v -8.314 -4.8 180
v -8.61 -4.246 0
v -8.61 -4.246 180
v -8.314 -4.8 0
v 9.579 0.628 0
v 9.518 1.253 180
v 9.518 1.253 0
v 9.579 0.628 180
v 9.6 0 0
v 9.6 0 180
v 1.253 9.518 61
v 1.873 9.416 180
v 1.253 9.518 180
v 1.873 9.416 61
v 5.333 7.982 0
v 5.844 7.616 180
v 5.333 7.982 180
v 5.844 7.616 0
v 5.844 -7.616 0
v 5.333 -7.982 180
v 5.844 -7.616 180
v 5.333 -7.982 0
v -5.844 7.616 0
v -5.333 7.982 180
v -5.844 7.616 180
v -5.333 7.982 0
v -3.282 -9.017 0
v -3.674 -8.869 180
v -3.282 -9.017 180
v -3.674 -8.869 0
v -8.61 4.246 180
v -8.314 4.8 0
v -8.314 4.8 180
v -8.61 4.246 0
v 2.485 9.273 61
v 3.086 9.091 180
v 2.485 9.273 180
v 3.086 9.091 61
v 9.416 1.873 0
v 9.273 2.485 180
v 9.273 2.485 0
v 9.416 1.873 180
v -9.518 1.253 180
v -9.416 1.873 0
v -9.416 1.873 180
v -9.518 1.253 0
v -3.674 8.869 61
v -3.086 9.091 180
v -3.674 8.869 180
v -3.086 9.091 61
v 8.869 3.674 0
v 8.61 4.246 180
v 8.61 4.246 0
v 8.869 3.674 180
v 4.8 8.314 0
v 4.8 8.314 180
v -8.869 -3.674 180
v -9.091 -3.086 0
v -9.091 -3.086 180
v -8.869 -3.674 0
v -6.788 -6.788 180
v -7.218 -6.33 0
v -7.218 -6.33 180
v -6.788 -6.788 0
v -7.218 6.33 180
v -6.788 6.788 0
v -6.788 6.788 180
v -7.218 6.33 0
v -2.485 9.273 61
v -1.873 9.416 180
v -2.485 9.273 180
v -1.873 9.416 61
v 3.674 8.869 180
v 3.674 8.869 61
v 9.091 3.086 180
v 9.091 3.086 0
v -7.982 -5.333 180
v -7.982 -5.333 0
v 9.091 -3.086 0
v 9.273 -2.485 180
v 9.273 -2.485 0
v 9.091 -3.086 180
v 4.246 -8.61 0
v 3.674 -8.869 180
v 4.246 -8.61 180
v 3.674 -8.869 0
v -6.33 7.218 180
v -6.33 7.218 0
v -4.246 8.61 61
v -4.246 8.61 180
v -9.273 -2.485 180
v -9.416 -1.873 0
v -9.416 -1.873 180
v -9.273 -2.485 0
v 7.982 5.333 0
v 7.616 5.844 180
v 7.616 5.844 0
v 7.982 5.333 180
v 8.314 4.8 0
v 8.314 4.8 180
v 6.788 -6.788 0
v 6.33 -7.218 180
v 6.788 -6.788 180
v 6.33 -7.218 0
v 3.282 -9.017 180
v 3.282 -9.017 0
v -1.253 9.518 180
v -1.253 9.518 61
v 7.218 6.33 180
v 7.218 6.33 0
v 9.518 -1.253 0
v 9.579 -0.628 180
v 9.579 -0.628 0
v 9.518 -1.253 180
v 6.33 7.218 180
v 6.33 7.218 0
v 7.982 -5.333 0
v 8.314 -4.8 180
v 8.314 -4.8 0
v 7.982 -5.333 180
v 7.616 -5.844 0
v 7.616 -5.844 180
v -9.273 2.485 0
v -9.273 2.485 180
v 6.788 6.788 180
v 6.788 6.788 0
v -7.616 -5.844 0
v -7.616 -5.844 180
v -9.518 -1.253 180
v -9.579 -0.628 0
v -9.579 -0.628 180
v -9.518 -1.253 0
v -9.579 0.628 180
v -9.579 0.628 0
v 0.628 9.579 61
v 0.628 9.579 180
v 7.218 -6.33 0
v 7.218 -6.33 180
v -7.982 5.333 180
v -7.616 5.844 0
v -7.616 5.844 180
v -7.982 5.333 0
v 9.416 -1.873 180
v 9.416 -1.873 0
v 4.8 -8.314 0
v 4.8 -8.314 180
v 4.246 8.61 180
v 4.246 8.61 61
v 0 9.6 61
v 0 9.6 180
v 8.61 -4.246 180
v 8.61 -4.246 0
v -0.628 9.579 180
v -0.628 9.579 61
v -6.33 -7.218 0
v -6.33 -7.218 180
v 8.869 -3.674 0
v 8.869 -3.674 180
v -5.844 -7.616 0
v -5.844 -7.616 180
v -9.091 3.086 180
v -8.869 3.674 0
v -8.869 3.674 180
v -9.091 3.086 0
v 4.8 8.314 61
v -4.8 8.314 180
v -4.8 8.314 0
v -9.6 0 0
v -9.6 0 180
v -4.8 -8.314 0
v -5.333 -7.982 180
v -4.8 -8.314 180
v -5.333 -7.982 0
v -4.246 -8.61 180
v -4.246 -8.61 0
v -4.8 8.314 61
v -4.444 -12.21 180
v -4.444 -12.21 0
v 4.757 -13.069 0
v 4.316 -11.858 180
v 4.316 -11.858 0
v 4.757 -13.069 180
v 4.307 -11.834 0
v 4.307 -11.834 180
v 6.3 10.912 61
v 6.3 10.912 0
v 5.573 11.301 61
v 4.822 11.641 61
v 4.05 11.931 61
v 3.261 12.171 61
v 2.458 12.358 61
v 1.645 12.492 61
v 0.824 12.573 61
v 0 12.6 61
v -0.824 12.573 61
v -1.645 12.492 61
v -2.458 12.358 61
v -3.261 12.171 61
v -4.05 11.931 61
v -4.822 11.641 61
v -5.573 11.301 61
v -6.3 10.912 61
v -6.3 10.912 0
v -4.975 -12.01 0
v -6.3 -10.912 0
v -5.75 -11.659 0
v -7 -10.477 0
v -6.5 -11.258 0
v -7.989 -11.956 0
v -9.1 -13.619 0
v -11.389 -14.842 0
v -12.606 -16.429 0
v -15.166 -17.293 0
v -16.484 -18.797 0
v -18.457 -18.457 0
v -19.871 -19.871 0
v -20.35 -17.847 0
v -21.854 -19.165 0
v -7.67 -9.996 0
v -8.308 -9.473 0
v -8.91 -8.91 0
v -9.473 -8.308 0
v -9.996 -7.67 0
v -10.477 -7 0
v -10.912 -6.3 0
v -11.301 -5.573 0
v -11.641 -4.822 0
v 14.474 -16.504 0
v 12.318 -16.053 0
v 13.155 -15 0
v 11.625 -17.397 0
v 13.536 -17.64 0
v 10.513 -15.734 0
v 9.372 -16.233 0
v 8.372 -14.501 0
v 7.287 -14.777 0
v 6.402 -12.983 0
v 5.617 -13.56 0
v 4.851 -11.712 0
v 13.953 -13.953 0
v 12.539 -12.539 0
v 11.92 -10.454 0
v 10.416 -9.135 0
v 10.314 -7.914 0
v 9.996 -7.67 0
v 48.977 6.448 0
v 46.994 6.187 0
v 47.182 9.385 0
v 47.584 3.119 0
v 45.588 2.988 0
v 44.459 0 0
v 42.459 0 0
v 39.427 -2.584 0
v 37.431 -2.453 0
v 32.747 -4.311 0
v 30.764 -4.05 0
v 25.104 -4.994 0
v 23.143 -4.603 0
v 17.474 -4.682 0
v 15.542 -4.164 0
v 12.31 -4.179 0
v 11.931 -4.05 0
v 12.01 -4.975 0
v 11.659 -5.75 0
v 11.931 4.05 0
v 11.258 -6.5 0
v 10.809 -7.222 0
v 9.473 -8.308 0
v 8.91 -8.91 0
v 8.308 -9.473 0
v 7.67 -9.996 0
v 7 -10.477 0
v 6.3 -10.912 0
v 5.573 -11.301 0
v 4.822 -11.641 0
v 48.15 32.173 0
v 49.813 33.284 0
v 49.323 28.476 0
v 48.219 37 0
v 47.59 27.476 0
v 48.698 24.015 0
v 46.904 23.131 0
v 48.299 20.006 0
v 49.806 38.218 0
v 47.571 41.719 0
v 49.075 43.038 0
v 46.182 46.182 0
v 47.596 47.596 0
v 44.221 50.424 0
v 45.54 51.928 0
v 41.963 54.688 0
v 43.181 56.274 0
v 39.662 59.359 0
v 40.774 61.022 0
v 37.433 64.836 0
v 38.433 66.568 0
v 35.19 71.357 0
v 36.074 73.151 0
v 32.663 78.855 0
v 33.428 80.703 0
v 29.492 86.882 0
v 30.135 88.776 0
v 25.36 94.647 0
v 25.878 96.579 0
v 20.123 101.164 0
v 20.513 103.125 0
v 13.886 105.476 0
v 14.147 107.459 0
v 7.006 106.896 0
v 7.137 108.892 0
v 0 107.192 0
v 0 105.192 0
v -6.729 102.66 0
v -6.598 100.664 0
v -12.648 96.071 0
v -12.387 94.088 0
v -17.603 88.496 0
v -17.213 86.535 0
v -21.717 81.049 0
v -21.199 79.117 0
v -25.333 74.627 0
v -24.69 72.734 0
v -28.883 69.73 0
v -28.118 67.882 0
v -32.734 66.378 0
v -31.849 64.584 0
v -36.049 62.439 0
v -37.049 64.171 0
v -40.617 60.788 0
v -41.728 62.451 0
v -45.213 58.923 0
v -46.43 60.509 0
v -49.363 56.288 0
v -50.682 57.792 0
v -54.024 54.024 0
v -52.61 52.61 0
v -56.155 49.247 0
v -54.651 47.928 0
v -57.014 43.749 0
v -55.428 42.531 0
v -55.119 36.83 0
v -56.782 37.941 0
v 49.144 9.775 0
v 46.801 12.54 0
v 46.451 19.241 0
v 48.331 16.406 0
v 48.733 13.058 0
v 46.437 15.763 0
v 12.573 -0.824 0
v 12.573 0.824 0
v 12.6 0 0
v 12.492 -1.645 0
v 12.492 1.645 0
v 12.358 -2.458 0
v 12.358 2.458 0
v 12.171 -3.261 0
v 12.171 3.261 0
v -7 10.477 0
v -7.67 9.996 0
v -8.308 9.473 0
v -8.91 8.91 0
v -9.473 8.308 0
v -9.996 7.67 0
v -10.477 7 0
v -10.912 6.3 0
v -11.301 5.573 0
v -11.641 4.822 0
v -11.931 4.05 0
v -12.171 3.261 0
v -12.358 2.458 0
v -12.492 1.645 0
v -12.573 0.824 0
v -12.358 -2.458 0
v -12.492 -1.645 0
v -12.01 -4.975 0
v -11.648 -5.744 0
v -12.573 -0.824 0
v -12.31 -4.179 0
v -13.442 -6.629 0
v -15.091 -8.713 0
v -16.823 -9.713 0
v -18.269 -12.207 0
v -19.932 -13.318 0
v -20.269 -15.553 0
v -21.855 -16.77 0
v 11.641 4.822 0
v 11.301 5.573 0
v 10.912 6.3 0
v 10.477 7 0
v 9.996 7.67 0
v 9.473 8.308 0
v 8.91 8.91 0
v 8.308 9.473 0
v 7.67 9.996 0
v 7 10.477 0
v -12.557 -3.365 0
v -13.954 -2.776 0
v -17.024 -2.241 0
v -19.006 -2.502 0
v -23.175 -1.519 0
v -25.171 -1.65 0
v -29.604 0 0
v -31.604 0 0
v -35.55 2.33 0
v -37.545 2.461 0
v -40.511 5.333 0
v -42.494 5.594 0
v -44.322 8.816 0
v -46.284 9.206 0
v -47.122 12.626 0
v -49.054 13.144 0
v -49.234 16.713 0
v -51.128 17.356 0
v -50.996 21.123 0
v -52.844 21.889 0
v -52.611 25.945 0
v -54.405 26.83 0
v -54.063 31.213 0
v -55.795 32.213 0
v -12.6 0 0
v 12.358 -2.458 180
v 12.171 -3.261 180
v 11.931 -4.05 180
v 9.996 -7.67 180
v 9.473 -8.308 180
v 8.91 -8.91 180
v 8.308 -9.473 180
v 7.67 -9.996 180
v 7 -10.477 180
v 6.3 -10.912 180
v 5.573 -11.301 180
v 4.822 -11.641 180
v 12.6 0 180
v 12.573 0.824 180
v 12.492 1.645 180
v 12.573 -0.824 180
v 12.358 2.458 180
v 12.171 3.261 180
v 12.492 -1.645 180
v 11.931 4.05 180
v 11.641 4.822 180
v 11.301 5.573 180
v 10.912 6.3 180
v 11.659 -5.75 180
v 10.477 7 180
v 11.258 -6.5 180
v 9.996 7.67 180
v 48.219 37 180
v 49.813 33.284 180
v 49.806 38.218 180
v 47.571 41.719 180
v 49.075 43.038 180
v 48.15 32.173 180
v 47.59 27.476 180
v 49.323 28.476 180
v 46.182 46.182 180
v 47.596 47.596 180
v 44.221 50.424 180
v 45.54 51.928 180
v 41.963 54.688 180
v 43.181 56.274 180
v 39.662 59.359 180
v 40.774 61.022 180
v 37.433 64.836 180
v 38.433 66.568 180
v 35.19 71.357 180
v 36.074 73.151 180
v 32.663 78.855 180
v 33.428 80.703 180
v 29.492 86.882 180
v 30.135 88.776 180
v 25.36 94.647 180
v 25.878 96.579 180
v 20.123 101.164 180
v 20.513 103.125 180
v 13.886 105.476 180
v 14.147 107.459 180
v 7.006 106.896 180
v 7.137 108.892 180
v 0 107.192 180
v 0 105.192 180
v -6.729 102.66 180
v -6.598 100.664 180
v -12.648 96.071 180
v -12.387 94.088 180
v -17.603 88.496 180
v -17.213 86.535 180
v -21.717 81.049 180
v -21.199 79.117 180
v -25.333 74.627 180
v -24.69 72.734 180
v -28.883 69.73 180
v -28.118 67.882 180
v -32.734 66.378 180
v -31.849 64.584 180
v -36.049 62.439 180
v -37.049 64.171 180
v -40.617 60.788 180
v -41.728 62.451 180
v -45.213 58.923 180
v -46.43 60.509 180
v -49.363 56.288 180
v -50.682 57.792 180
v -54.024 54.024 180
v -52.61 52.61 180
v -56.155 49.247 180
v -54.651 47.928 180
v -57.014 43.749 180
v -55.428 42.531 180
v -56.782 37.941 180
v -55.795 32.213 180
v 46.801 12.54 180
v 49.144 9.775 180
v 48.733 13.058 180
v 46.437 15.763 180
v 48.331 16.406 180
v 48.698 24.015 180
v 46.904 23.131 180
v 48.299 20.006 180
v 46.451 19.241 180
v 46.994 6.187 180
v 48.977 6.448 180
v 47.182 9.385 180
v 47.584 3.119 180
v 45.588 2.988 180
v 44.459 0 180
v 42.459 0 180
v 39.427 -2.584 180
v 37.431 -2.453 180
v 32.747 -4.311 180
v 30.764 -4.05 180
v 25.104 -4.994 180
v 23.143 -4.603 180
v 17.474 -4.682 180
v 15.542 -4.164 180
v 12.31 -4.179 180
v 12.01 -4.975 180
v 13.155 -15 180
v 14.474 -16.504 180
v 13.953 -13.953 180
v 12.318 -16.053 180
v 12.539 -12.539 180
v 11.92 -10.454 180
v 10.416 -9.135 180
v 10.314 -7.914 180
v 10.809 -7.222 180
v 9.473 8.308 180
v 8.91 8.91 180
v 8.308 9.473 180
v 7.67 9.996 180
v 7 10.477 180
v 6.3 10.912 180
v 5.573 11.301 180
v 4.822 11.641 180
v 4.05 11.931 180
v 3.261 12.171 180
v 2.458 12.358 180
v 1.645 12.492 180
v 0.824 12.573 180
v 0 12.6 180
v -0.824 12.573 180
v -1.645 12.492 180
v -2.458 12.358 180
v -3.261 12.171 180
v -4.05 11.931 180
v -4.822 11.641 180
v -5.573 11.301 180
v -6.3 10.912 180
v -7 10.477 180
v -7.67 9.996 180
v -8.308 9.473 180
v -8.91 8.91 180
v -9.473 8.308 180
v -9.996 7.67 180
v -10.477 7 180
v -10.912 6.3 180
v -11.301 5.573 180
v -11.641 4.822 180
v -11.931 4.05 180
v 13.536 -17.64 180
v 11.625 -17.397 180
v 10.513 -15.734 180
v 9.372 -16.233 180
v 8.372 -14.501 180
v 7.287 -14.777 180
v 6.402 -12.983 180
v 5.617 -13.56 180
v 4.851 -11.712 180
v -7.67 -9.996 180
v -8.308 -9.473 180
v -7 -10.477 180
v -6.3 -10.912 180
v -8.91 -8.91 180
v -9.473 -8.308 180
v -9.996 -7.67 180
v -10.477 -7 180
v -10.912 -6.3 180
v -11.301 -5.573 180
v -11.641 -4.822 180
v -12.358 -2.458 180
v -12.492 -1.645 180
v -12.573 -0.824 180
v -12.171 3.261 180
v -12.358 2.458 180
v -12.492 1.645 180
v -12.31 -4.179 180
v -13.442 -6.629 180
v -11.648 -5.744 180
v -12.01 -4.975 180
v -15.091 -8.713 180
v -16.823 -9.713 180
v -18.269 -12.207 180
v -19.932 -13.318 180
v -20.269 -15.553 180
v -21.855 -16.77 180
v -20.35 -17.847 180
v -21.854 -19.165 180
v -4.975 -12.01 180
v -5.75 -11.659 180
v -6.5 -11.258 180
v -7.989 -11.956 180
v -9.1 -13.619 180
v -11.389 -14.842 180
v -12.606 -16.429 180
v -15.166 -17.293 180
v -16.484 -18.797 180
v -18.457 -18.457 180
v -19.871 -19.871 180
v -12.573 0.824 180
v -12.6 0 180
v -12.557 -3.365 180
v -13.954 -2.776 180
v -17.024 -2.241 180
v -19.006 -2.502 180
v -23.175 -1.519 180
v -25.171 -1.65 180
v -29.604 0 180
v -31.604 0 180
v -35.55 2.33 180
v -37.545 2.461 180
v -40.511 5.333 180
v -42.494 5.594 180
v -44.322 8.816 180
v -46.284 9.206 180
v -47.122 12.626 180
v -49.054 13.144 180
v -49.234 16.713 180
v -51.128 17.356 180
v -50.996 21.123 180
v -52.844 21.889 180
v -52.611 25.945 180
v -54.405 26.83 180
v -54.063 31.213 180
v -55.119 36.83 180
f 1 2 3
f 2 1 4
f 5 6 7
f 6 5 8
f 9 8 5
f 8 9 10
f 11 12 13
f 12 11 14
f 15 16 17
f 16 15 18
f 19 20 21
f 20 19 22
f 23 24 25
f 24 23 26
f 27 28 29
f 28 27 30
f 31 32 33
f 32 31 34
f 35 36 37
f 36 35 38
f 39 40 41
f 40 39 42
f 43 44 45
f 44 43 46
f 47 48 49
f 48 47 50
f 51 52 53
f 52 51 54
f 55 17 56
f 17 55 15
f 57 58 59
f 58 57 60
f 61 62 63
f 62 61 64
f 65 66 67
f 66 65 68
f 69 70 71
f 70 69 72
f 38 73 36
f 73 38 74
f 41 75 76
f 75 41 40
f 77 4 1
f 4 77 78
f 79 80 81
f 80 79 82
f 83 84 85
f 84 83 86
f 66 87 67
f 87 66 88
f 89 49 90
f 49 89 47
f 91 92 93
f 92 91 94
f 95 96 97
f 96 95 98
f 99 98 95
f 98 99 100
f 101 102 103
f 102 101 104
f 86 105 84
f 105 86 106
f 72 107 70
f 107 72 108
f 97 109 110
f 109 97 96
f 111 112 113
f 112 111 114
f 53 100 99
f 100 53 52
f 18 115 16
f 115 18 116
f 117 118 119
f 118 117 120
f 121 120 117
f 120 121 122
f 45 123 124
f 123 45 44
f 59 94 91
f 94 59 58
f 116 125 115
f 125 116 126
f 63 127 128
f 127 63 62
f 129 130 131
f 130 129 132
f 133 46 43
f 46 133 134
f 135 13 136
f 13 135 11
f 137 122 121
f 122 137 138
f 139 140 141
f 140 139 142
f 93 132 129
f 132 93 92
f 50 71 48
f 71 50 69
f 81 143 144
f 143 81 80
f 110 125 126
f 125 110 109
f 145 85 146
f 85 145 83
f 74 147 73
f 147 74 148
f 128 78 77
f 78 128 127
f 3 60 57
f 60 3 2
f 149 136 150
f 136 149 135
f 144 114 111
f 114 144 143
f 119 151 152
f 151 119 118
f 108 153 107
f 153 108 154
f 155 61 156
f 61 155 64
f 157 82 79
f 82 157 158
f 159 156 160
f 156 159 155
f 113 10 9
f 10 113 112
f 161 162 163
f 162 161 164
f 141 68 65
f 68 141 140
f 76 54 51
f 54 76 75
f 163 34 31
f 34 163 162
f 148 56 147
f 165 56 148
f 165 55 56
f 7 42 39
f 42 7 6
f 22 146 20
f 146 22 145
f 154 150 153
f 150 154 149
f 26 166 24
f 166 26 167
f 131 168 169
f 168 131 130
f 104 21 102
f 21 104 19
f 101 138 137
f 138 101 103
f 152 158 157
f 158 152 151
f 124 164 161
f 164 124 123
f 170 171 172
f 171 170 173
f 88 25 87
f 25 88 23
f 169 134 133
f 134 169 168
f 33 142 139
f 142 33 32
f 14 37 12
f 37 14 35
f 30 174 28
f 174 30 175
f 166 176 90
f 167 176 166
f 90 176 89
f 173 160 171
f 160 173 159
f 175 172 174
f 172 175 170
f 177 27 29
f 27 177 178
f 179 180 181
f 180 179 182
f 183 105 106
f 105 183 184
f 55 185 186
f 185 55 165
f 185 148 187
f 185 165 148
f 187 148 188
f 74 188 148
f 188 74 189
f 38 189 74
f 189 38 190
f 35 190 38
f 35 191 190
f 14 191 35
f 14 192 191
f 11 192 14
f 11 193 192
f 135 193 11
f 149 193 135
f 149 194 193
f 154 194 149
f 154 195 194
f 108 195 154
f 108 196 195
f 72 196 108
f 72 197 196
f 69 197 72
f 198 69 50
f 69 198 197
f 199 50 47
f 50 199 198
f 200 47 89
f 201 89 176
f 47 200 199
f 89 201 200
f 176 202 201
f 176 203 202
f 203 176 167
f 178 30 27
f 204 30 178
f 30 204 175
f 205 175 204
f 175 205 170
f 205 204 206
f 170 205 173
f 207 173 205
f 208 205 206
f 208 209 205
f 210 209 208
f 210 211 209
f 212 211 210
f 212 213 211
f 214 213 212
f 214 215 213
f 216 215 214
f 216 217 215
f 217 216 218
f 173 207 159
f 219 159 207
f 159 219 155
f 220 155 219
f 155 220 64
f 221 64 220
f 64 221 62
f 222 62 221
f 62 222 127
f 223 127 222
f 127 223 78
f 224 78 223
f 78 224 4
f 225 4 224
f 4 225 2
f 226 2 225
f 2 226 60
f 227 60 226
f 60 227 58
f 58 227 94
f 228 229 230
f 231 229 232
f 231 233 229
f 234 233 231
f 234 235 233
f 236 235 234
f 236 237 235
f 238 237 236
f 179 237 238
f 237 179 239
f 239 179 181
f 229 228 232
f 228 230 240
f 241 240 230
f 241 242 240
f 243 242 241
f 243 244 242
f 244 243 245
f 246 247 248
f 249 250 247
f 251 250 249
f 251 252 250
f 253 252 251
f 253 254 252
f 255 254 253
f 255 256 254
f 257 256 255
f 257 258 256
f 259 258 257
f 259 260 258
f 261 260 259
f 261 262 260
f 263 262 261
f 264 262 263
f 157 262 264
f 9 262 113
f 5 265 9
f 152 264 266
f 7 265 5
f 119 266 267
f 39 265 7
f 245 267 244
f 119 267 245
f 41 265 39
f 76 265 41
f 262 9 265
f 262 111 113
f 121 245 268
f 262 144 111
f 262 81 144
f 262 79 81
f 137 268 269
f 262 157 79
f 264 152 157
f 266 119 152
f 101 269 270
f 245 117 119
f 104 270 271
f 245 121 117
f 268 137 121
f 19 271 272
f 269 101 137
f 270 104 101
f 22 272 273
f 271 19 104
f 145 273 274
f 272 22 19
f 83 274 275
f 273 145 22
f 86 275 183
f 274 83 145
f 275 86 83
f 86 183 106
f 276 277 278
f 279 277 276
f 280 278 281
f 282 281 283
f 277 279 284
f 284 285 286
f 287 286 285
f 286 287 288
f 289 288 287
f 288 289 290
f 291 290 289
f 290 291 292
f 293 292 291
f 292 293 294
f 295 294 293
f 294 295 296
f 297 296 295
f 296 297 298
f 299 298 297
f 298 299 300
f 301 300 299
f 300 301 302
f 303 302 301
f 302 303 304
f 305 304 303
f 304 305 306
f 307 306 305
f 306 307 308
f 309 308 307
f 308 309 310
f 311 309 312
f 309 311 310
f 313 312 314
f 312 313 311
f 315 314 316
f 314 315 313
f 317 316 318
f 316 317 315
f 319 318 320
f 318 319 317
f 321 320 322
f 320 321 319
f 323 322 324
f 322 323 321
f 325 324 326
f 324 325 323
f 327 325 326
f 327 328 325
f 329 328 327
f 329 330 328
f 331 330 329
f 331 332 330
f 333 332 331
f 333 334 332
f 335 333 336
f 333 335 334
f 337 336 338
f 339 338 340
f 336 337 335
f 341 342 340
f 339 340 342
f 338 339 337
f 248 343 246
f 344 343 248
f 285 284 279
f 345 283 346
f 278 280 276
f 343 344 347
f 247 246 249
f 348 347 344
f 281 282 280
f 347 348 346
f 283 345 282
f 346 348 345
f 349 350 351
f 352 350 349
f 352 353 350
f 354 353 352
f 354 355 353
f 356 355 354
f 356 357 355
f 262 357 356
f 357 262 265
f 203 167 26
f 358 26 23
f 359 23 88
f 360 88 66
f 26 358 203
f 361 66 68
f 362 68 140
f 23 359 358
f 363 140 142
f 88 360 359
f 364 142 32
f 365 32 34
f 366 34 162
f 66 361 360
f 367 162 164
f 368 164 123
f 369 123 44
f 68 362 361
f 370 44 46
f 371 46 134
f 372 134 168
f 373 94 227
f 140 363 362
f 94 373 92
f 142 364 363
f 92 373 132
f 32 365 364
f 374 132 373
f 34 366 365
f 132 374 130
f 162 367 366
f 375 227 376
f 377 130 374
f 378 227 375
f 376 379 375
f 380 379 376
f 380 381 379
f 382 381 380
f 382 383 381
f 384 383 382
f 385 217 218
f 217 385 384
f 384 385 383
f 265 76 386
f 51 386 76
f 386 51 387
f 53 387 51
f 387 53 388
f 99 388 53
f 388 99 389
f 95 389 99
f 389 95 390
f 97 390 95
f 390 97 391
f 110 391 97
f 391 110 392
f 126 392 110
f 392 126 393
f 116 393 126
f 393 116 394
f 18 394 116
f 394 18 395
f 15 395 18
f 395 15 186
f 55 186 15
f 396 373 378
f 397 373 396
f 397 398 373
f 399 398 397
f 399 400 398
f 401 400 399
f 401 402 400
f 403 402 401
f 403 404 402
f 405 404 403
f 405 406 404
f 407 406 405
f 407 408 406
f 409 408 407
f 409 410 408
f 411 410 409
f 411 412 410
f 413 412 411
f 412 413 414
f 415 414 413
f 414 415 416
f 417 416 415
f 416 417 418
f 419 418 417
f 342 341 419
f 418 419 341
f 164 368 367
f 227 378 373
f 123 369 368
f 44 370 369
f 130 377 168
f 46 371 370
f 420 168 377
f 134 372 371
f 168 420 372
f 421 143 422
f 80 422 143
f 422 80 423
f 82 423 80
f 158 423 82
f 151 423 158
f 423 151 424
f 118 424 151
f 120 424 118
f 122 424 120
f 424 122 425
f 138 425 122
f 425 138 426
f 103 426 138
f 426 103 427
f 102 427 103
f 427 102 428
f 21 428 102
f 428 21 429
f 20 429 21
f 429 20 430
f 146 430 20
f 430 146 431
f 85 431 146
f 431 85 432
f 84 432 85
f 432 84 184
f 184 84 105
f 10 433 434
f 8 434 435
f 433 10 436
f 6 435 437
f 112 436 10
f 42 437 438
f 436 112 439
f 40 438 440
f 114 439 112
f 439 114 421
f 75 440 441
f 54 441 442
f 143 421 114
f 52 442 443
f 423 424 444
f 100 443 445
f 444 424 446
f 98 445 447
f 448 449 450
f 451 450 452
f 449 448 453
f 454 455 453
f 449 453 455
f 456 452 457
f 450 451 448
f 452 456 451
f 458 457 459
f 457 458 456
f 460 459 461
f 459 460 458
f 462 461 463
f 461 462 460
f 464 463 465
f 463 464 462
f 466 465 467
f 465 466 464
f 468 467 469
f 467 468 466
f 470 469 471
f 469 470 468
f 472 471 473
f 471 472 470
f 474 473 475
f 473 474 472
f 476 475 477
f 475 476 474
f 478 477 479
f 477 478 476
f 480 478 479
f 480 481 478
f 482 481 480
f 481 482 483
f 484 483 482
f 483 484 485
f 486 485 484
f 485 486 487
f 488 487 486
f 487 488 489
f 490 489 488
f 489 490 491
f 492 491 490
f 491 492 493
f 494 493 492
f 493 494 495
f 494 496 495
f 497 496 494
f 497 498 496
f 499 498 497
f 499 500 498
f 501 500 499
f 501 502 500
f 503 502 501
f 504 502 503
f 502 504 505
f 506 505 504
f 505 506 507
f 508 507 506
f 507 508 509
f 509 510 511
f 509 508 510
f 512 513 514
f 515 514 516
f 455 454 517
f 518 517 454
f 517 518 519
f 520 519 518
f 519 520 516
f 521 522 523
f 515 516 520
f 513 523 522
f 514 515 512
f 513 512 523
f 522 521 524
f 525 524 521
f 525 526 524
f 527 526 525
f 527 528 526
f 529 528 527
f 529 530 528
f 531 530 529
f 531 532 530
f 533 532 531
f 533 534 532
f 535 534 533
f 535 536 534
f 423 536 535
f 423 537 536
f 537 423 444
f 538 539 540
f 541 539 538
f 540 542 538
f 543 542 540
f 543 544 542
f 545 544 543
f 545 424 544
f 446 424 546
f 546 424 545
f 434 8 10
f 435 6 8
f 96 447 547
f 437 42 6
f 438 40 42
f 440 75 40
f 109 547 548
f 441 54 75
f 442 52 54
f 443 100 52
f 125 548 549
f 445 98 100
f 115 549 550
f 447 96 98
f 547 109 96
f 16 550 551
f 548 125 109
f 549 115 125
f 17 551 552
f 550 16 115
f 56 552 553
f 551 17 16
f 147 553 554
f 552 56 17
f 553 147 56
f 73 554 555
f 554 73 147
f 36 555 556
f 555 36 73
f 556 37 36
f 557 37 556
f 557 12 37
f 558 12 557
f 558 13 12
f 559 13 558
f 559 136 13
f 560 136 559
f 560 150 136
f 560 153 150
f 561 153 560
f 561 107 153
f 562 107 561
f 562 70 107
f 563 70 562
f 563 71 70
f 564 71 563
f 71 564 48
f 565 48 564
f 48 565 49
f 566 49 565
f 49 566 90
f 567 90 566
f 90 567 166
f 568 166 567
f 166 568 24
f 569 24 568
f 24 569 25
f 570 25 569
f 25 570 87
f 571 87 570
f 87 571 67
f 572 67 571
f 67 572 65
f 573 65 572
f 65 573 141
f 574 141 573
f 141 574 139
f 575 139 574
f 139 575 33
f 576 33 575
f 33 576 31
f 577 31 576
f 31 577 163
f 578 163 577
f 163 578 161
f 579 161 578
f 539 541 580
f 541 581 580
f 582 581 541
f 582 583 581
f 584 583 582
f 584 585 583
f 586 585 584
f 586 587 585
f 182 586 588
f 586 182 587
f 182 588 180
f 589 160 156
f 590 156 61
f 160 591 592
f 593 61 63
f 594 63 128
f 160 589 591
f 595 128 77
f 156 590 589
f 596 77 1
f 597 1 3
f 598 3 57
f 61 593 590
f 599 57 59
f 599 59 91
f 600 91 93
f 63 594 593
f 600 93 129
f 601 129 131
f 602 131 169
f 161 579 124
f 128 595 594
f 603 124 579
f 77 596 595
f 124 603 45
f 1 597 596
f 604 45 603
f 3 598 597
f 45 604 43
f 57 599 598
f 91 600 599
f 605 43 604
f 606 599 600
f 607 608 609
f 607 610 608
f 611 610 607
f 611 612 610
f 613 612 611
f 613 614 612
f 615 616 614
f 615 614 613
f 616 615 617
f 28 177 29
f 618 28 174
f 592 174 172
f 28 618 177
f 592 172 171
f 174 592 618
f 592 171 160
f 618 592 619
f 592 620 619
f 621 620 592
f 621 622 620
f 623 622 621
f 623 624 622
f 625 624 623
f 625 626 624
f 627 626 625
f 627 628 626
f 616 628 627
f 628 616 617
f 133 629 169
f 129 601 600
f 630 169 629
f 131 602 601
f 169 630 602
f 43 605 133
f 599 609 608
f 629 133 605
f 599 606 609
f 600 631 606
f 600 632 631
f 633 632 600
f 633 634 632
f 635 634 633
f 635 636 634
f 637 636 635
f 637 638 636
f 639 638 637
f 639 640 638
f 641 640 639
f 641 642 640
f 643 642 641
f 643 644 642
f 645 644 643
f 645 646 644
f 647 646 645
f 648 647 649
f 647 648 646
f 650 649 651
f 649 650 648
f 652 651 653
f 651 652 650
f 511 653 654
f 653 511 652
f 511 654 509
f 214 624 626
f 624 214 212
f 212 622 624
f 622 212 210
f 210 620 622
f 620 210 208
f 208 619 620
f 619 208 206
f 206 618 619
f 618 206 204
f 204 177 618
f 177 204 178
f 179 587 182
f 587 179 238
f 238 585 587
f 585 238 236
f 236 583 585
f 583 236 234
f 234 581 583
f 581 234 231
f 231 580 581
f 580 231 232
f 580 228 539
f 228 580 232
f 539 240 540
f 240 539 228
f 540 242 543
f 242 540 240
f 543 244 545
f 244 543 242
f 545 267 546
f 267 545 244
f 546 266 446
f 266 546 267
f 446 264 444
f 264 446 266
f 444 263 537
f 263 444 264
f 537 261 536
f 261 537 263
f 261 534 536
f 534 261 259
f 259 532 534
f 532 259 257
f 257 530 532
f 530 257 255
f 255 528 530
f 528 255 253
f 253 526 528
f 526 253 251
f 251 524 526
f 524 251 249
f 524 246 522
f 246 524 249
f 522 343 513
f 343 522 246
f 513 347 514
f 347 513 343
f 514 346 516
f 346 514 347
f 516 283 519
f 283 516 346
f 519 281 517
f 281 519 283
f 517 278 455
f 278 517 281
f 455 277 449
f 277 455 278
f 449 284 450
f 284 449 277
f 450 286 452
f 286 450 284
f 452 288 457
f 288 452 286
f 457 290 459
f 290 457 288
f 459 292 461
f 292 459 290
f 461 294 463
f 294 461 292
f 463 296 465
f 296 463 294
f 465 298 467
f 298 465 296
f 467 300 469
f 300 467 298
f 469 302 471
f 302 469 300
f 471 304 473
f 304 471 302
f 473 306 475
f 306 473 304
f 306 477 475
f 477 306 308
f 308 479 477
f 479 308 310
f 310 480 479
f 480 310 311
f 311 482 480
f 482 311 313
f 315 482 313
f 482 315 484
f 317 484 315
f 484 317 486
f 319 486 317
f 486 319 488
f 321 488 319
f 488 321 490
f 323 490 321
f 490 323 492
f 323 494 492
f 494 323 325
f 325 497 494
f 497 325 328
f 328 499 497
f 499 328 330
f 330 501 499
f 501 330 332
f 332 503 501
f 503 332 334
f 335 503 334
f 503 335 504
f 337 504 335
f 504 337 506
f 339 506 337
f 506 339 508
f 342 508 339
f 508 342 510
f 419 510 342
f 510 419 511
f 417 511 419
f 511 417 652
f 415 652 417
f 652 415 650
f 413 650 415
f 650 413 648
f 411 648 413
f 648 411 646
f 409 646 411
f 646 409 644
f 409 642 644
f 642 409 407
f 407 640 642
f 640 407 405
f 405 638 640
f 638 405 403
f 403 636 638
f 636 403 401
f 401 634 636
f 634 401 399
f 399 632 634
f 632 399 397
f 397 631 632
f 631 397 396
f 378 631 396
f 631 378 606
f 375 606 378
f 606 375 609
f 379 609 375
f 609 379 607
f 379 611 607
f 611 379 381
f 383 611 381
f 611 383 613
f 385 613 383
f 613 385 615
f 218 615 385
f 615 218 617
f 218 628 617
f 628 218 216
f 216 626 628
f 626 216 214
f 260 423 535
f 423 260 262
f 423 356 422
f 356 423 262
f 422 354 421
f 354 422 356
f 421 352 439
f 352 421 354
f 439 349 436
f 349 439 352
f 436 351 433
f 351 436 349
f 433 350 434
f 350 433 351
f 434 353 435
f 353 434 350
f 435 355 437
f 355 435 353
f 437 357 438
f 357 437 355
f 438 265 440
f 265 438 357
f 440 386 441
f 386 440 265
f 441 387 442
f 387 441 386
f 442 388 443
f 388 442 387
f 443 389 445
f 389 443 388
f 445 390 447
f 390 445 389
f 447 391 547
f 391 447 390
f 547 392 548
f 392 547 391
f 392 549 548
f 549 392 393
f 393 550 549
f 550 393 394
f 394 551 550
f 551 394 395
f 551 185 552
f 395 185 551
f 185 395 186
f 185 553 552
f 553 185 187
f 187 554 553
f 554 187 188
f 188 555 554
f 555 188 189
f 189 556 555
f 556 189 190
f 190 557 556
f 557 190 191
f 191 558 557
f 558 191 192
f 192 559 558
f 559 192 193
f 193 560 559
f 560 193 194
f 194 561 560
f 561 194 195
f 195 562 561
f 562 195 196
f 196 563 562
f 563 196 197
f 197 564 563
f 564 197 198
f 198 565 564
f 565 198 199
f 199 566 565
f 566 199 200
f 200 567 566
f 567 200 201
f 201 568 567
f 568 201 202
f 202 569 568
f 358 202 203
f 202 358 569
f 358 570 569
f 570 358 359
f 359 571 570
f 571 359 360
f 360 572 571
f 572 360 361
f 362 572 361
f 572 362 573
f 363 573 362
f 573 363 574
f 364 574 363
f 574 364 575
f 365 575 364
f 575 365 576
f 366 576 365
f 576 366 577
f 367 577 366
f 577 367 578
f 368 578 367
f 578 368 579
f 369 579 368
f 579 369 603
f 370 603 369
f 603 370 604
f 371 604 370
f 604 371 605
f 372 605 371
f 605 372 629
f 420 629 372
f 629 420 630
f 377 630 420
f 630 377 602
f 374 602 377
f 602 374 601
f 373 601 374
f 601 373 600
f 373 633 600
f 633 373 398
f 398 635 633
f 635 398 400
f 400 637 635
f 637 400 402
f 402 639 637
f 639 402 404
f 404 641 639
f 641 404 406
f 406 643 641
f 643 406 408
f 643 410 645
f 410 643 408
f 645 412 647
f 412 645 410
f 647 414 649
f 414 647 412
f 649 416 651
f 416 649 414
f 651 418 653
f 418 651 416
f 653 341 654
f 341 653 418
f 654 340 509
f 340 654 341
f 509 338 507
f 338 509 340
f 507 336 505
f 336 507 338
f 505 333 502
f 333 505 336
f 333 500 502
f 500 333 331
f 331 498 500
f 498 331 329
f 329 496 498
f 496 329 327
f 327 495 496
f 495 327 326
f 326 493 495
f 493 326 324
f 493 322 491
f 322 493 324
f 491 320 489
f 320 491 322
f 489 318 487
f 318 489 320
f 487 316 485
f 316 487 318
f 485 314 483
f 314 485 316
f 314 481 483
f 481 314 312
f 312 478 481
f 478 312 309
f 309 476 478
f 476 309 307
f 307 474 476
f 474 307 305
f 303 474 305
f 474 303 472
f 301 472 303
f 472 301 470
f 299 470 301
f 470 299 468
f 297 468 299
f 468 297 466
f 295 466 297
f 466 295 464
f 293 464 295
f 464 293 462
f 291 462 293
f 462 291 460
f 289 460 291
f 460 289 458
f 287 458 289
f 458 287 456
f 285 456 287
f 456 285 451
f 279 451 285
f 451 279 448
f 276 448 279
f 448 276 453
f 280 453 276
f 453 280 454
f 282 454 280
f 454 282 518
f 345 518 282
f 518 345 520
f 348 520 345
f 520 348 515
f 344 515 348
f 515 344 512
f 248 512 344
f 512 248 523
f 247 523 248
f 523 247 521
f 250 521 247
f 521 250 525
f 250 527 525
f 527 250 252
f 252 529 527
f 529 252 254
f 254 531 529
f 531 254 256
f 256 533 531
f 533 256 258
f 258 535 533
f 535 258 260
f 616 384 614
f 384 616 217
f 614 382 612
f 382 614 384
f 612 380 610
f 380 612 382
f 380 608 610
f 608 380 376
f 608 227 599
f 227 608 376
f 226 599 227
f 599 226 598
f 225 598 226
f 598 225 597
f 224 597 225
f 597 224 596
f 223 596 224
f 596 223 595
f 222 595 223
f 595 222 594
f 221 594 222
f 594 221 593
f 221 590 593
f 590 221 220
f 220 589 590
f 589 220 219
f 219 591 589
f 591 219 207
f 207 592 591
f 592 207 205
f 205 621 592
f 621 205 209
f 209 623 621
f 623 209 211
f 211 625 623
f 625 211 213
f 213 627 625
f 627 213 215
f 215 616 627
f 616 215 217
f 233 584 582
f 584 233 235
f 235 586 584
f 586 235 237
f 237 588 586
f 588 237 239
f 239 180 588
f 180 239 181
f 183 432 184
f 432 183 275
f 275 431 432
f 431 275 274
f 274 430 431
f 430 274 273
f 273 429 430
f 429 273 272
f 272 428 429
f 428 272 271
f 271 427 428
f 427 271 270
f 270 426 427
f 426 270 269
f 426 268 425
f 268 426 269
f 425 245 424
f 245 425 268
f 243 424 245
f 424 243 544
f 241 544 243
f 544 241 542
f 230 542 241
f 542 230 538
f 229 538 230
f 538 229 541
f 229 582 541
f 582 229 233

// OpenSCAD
// Lampenschirm für Stehlampe – organischer, wellenförmiger Querschnitt
// mit Klemmkragen, der in die Form integriert ist (keine D-Form mehr)
// Alle Maße in Millimetern (Regel: units-mm)
//
// Kontext: context/printer.md, context/tolerances.md und context/materials.md
// waren zum Zeitpunkt der Modellierung leer (siehe Regel: context-first).
// Annahmen aus dem Design-Dialog (siehe auch 001/002):
//   - Baubett >= 200mm Z-Höhe vorhanden -> Schirm wird als ein Teil,
//     stehend, in voller Höhe gedruckt.
//   - Klemmkragen als offener Federclip (C-Ring): Innendurchmesser 0.8mm
//     unter Stangendurchmesser (19.2mm ID auf 20mm Stange) für Vorspannung.
//   - E14-Fassung wird separat an der Stange montiert.
//
// Änderungen gegenüber 011 (Nutzer-Feedback: "schon wieder Auswüchse an der
// Klemme"):
//   - Ursache gefunden per gezieltem Sweep um die neck_guard_width-Grenze:
//     der Radius-Deckel (min(r_free, max_neck_r)) griff bisher als HARTER
//     Cutoff bei genau d=40° - innerhalb 14.3mm gedeckelt, direkt danach
//     ungebremst frei. Bei kleiner Wellenamplitude war der Sprung an dieser
//     Stelle klein (~1mm) und unsichtbar; bei der in 011 stark erhöhten
//     Amplitude sprang der Radius dort um >8mm auf 0.5° - ein scharfer
//     Zacken/Knick in der Kontur.
//   - Fix: der Deckel selbst wächst jetzt weich (smoothstep) von max_neck_r
//     bei d=0 auf einen praktisch unbegrenzten Wert bei d=neck_guard_width,
//     statt hart abzuschneiden. Damit lockert sich die Begrenzung immer
//     graduell, unabhängig von der Wellenamplitude - kein abrupter Sprung
//     mehr möglich. Per Sweep verifiziert: größte Radius-Änderung zwischen
//     zwei benachbarten 0.25°-Stützpunkten liegt jetzt im Bruchteil-mm-
//     Bereich statt bei mehreren mm.

// ---- Parameter ----
shade_height = 180;   // Gesamthöhe des Schirms
wall_t       = 2;     // Wandstärke Schirm (durchgehend, auch am Klemmkragen-Übergang)

rod_d      = 20;                 // Durchmesser der Metallstange
rod_r      = rod_d / 2;
clip_id    = 19.2;               // Innendurchmesser Klemmkragen (Vorspannung, ~0.8mm Untermaß)
clip_r_in  = clip_id / 2;
clip_wall  = 3;                  // Wandstärke Klemmkragen (dicker als Schirmwand, für Klemmkraft)
clip_r_out = clip_r_in + clip_wall;
clip_gap_deg = 40;               // Öffnungswinkel des C-Rings (Montagespalt, zeigt nach -Y)

socket_slot_deg    = 60;              // Öffnungswinkel des Fassungs-Schlitzes (Innenseite, +Y) - Annahme
socket_slot_height = shade_height / 3; // unteres Drittel der Klemme ist auf der Innenseite offen

// Organische Grundform: Potenzfunktion statt Fourier-Reihe, damit die
// Rückseite (θ=270°) über einen breiten Winkelbereich flach bleibt, statt
// steil anzusteigen.
back_r  = 13;     // Zielradius an der Rückseite (θ=270°) - eng am Klemmkragen
front_r = 95;      // Zielradius an der Front (θ=90°)
flatten_power = 2; // höher = flacherer/breiterer "Hals" um die Klemme, aber schmalere Seiten

// Wellen-Überlagerung für den organischen/wellenförmigen Look (Front/Seiten)
wave_amp1 = 10;  wave_freq1 = 5;  wave_phase1 = 40;
wave_amp2 = 5;   wave_freq2 = 8;  wave_phase2 = 115;
wave_fade_width = 55;   // Welle erreicht erst ab diesem Winkelabstand von der Rückseite volle Stärke

// Sicherheitsgrenzen nahe der Rückseite: der Deckel (Obergrenze) wächst
// WEICH von max_neck_r (bei d=0) auf einen praktisch unbegrenzten Wert (bei
// d=neck_guard_width) - siehe neck_cap(). Kein harter Sprung mehr, auch bei
// großer Wellenamplitude.
neck_guard_width = 40;                     // Winkelbereich, über den der Deckel ausläuft
max_neck_r = clip_r_out + wall_t - 0.3;    // = 14.3mm, garantiert Überlappung mit Sicherheitsabstand
min_r      = 13.0;                          // untere Grenze, IMMER > clip_r_out (12.6mm)
cap_relax_far = 1000;                       // "praktisch unbegrenzt" für den ausgelaufenen Deckel

cut_far = 300;   // "unendlich" großer Radius für Schnitte, die garantiert bis nach außen durchbrechen sollen

$fn = 96;

// Winkelabstand zwischen theta und center (0-180°, robust über den 0°/360°-Übergang)
function angle_diff(theta, center) =
    let(d = abs(theta - center))
    (d > 180) ? 360 - d : d;

// Hüllkurve 0 (direkt an der Rückseite) bis 1 (ab wave_fade_width Grad Abstand)
function wave_envelope(theta) =
    let(d = angle_diff(theta, 270))
    (d >= wave_fade_width) ? 1 : (1 - cos(180 * d / wave_fade_width)) / 2;

// Weicher Übergang 0->1 zwischen edge0 und edge1 (klassisches smoothstep)
function smoothstep(edge0, edge1, x) =
    let(t = min(max((x - edge0) / (edge1 - edge0), 0), 1))
    t * t * (3 - 2 * t);

// Deckel (Obergrenze) für den Radius nahe der Rückseite: startet bei
// max_neck_r (d=0) und wächst weich auf cap_relax_far (d>=neck_guard_width) -
// dadurch kein harter Sprung an der Zonengrenze, unabhängig von der
// Wellenamplitude.
function neck_cap(d) =
    max_neck_r + (cap_relax_far - max_neck_r) * smoothstep(0, neck_guard_width, d);

// Radius der organischen Außenkontur in Abhängigkeit vom Winkel θ (Grad)
function organic_r(theta) =
    let(phi = theta - 90)
    let(u = (1 + cos(phi)) / 2)   // 0 an der Rückseite (θ=270°), 1 an der Front (θ=90°)
    let(base = back_r + (front_r - back_r) * pow(u, flatten_power))
    let(raw_wave = wave_amp1 * sin(wave_freq1 * theta + wave_phase1)
                 + wave_amp2 * sin(wave_freq2 * theta + wave_phase2))
    let(wave = raw_wave * wave_envelope(theta))
    let(r_free = base + wave)
    let(d = angle_diff(theta, 270))
    let(r_guarded = min(r_free, neck_cap(d)))
    max(r_guarded, min_r);

// Radius der Kavität (Hohlraum-Grenze): normale Wandinnenseite, aber nie
// enger als der Klemmkragen (clip_r_out) - dadurch bleibt der Kragen überall
// solide statt hohl, ganz ohne separate Kreis-Verschneidung.
function cavity_r(theta) =
    max(organic_r(theta) - wall_t, clip_r_out);

// Geschlossenes 2D-Profil, um shrink (mm) nach innen verkleinert
module organic_outline(shrink = 0) {
    step = 360 / $fn;
    polygon(points = [
        for (t = [0 : step : 360 - step])
            [(organic_r(t) - shrink) * cos(t), (organic_r(t) - shrink) * sin(t)]
    ]);
}

// Ringform (Annulus): gefüllte Fläche bis cavity_r(θ) MINUS Kreis(clip_r_out).
// Wichtig: eine reine gefüllte Fläche bis cavity_r(θ) wäre FALSCH - da
// cavity_r(θ) an Winkeln fern der Rückseite sehr groß wird (z.B. ~93mm an
// der Front), würde eine gefüllte Fläche dort den kompletten Klemmkragen
// mit-entfernen. Der Kreisabzug stellt sicher, dass r < clip_r_out IMMER
// massiv bleibt, unabhängig vom Winkel.
module cavity_outline() {
    step = 360 / $fn;
    difference() {
        polygon(points = [
            for (t = [0 : step : 360 - step])
                [cavity_r(t) * cos(t), cavity_r(t) * sin(t)]
        ]);
        circle(r = clip_r_out);
    }
}

// Keilförmiger 2D-Ausschnitt, zentriert auf Winkel 0
module pie_wedge_2d(radius, angle_deg) {
    a = angle_deg / 2;
    polygon(points = [
        [0, 0],
        [radius * cos(a), radius * sin(a)],
        [radius * cos(-a), radius * sin(-a)]
    ]);
}

// 2D-Profil der Wand: durchgehend wall_t dick, mit massivem, nahtlos
// integriertem Klemmkragen-Rohling an der Rückseite
module shell_with_boss_2d() {
    difference() {
        organic_outline(0);
        cavity_outline();
    }
}

module organic_shell() {
    linear_extrude(height = shade_height)
        shell_with_boss_2d();
}

// Radialer Schlitz von z0 bis z1, in Richtung facing_deg ausgerichtet
module radial_slot(radius, angle_deg, facing_deg, z0, z1) {
    translate([0, 0, z0])
        rotate([0, 0, facing_deg])
            linear_extrude(z1 - z0)
                pie_wedge_2d(radius, angle_deg);
}

// Alle Ausschnitte für die Klemme: durchgehende Stangenbohrung + Montagespalt
// (volle Höhe, -Y, bricht bis zur echten Außenwand durch, damit seitlich
// eingeclipst werden kann) + Fassungs-Schlitz (unteres Drittel, +Y, öffnet
// nur bis in den ohnehin dort schon hohlen Innenraum)
module clamp_cutouts() {
    union() {
        translate([0, 0, -1])
            cylinder(r = clip_r_in, h = shade_height + 2);

        radial_slot(cut_far, clip_gap_deg, 270, -1, shade_height + 1);

        radial_slot(clip_r_out + 5, socket_slot_deg, 90, -1, socket_slot_height + 1);
    }
}

// render() erzwingt die vollständige (exakte) Boolesche Berechnung statt der
// schnellen OpenCSG-Live-Vorschau, damit die Klemme auch in der OpenSCAD-
// Vorschau (F5) korrekt dargestellt wird.
render(convexity = 10)
    difference() {
        organic_shell();
        clamp_cutouts();
    }
